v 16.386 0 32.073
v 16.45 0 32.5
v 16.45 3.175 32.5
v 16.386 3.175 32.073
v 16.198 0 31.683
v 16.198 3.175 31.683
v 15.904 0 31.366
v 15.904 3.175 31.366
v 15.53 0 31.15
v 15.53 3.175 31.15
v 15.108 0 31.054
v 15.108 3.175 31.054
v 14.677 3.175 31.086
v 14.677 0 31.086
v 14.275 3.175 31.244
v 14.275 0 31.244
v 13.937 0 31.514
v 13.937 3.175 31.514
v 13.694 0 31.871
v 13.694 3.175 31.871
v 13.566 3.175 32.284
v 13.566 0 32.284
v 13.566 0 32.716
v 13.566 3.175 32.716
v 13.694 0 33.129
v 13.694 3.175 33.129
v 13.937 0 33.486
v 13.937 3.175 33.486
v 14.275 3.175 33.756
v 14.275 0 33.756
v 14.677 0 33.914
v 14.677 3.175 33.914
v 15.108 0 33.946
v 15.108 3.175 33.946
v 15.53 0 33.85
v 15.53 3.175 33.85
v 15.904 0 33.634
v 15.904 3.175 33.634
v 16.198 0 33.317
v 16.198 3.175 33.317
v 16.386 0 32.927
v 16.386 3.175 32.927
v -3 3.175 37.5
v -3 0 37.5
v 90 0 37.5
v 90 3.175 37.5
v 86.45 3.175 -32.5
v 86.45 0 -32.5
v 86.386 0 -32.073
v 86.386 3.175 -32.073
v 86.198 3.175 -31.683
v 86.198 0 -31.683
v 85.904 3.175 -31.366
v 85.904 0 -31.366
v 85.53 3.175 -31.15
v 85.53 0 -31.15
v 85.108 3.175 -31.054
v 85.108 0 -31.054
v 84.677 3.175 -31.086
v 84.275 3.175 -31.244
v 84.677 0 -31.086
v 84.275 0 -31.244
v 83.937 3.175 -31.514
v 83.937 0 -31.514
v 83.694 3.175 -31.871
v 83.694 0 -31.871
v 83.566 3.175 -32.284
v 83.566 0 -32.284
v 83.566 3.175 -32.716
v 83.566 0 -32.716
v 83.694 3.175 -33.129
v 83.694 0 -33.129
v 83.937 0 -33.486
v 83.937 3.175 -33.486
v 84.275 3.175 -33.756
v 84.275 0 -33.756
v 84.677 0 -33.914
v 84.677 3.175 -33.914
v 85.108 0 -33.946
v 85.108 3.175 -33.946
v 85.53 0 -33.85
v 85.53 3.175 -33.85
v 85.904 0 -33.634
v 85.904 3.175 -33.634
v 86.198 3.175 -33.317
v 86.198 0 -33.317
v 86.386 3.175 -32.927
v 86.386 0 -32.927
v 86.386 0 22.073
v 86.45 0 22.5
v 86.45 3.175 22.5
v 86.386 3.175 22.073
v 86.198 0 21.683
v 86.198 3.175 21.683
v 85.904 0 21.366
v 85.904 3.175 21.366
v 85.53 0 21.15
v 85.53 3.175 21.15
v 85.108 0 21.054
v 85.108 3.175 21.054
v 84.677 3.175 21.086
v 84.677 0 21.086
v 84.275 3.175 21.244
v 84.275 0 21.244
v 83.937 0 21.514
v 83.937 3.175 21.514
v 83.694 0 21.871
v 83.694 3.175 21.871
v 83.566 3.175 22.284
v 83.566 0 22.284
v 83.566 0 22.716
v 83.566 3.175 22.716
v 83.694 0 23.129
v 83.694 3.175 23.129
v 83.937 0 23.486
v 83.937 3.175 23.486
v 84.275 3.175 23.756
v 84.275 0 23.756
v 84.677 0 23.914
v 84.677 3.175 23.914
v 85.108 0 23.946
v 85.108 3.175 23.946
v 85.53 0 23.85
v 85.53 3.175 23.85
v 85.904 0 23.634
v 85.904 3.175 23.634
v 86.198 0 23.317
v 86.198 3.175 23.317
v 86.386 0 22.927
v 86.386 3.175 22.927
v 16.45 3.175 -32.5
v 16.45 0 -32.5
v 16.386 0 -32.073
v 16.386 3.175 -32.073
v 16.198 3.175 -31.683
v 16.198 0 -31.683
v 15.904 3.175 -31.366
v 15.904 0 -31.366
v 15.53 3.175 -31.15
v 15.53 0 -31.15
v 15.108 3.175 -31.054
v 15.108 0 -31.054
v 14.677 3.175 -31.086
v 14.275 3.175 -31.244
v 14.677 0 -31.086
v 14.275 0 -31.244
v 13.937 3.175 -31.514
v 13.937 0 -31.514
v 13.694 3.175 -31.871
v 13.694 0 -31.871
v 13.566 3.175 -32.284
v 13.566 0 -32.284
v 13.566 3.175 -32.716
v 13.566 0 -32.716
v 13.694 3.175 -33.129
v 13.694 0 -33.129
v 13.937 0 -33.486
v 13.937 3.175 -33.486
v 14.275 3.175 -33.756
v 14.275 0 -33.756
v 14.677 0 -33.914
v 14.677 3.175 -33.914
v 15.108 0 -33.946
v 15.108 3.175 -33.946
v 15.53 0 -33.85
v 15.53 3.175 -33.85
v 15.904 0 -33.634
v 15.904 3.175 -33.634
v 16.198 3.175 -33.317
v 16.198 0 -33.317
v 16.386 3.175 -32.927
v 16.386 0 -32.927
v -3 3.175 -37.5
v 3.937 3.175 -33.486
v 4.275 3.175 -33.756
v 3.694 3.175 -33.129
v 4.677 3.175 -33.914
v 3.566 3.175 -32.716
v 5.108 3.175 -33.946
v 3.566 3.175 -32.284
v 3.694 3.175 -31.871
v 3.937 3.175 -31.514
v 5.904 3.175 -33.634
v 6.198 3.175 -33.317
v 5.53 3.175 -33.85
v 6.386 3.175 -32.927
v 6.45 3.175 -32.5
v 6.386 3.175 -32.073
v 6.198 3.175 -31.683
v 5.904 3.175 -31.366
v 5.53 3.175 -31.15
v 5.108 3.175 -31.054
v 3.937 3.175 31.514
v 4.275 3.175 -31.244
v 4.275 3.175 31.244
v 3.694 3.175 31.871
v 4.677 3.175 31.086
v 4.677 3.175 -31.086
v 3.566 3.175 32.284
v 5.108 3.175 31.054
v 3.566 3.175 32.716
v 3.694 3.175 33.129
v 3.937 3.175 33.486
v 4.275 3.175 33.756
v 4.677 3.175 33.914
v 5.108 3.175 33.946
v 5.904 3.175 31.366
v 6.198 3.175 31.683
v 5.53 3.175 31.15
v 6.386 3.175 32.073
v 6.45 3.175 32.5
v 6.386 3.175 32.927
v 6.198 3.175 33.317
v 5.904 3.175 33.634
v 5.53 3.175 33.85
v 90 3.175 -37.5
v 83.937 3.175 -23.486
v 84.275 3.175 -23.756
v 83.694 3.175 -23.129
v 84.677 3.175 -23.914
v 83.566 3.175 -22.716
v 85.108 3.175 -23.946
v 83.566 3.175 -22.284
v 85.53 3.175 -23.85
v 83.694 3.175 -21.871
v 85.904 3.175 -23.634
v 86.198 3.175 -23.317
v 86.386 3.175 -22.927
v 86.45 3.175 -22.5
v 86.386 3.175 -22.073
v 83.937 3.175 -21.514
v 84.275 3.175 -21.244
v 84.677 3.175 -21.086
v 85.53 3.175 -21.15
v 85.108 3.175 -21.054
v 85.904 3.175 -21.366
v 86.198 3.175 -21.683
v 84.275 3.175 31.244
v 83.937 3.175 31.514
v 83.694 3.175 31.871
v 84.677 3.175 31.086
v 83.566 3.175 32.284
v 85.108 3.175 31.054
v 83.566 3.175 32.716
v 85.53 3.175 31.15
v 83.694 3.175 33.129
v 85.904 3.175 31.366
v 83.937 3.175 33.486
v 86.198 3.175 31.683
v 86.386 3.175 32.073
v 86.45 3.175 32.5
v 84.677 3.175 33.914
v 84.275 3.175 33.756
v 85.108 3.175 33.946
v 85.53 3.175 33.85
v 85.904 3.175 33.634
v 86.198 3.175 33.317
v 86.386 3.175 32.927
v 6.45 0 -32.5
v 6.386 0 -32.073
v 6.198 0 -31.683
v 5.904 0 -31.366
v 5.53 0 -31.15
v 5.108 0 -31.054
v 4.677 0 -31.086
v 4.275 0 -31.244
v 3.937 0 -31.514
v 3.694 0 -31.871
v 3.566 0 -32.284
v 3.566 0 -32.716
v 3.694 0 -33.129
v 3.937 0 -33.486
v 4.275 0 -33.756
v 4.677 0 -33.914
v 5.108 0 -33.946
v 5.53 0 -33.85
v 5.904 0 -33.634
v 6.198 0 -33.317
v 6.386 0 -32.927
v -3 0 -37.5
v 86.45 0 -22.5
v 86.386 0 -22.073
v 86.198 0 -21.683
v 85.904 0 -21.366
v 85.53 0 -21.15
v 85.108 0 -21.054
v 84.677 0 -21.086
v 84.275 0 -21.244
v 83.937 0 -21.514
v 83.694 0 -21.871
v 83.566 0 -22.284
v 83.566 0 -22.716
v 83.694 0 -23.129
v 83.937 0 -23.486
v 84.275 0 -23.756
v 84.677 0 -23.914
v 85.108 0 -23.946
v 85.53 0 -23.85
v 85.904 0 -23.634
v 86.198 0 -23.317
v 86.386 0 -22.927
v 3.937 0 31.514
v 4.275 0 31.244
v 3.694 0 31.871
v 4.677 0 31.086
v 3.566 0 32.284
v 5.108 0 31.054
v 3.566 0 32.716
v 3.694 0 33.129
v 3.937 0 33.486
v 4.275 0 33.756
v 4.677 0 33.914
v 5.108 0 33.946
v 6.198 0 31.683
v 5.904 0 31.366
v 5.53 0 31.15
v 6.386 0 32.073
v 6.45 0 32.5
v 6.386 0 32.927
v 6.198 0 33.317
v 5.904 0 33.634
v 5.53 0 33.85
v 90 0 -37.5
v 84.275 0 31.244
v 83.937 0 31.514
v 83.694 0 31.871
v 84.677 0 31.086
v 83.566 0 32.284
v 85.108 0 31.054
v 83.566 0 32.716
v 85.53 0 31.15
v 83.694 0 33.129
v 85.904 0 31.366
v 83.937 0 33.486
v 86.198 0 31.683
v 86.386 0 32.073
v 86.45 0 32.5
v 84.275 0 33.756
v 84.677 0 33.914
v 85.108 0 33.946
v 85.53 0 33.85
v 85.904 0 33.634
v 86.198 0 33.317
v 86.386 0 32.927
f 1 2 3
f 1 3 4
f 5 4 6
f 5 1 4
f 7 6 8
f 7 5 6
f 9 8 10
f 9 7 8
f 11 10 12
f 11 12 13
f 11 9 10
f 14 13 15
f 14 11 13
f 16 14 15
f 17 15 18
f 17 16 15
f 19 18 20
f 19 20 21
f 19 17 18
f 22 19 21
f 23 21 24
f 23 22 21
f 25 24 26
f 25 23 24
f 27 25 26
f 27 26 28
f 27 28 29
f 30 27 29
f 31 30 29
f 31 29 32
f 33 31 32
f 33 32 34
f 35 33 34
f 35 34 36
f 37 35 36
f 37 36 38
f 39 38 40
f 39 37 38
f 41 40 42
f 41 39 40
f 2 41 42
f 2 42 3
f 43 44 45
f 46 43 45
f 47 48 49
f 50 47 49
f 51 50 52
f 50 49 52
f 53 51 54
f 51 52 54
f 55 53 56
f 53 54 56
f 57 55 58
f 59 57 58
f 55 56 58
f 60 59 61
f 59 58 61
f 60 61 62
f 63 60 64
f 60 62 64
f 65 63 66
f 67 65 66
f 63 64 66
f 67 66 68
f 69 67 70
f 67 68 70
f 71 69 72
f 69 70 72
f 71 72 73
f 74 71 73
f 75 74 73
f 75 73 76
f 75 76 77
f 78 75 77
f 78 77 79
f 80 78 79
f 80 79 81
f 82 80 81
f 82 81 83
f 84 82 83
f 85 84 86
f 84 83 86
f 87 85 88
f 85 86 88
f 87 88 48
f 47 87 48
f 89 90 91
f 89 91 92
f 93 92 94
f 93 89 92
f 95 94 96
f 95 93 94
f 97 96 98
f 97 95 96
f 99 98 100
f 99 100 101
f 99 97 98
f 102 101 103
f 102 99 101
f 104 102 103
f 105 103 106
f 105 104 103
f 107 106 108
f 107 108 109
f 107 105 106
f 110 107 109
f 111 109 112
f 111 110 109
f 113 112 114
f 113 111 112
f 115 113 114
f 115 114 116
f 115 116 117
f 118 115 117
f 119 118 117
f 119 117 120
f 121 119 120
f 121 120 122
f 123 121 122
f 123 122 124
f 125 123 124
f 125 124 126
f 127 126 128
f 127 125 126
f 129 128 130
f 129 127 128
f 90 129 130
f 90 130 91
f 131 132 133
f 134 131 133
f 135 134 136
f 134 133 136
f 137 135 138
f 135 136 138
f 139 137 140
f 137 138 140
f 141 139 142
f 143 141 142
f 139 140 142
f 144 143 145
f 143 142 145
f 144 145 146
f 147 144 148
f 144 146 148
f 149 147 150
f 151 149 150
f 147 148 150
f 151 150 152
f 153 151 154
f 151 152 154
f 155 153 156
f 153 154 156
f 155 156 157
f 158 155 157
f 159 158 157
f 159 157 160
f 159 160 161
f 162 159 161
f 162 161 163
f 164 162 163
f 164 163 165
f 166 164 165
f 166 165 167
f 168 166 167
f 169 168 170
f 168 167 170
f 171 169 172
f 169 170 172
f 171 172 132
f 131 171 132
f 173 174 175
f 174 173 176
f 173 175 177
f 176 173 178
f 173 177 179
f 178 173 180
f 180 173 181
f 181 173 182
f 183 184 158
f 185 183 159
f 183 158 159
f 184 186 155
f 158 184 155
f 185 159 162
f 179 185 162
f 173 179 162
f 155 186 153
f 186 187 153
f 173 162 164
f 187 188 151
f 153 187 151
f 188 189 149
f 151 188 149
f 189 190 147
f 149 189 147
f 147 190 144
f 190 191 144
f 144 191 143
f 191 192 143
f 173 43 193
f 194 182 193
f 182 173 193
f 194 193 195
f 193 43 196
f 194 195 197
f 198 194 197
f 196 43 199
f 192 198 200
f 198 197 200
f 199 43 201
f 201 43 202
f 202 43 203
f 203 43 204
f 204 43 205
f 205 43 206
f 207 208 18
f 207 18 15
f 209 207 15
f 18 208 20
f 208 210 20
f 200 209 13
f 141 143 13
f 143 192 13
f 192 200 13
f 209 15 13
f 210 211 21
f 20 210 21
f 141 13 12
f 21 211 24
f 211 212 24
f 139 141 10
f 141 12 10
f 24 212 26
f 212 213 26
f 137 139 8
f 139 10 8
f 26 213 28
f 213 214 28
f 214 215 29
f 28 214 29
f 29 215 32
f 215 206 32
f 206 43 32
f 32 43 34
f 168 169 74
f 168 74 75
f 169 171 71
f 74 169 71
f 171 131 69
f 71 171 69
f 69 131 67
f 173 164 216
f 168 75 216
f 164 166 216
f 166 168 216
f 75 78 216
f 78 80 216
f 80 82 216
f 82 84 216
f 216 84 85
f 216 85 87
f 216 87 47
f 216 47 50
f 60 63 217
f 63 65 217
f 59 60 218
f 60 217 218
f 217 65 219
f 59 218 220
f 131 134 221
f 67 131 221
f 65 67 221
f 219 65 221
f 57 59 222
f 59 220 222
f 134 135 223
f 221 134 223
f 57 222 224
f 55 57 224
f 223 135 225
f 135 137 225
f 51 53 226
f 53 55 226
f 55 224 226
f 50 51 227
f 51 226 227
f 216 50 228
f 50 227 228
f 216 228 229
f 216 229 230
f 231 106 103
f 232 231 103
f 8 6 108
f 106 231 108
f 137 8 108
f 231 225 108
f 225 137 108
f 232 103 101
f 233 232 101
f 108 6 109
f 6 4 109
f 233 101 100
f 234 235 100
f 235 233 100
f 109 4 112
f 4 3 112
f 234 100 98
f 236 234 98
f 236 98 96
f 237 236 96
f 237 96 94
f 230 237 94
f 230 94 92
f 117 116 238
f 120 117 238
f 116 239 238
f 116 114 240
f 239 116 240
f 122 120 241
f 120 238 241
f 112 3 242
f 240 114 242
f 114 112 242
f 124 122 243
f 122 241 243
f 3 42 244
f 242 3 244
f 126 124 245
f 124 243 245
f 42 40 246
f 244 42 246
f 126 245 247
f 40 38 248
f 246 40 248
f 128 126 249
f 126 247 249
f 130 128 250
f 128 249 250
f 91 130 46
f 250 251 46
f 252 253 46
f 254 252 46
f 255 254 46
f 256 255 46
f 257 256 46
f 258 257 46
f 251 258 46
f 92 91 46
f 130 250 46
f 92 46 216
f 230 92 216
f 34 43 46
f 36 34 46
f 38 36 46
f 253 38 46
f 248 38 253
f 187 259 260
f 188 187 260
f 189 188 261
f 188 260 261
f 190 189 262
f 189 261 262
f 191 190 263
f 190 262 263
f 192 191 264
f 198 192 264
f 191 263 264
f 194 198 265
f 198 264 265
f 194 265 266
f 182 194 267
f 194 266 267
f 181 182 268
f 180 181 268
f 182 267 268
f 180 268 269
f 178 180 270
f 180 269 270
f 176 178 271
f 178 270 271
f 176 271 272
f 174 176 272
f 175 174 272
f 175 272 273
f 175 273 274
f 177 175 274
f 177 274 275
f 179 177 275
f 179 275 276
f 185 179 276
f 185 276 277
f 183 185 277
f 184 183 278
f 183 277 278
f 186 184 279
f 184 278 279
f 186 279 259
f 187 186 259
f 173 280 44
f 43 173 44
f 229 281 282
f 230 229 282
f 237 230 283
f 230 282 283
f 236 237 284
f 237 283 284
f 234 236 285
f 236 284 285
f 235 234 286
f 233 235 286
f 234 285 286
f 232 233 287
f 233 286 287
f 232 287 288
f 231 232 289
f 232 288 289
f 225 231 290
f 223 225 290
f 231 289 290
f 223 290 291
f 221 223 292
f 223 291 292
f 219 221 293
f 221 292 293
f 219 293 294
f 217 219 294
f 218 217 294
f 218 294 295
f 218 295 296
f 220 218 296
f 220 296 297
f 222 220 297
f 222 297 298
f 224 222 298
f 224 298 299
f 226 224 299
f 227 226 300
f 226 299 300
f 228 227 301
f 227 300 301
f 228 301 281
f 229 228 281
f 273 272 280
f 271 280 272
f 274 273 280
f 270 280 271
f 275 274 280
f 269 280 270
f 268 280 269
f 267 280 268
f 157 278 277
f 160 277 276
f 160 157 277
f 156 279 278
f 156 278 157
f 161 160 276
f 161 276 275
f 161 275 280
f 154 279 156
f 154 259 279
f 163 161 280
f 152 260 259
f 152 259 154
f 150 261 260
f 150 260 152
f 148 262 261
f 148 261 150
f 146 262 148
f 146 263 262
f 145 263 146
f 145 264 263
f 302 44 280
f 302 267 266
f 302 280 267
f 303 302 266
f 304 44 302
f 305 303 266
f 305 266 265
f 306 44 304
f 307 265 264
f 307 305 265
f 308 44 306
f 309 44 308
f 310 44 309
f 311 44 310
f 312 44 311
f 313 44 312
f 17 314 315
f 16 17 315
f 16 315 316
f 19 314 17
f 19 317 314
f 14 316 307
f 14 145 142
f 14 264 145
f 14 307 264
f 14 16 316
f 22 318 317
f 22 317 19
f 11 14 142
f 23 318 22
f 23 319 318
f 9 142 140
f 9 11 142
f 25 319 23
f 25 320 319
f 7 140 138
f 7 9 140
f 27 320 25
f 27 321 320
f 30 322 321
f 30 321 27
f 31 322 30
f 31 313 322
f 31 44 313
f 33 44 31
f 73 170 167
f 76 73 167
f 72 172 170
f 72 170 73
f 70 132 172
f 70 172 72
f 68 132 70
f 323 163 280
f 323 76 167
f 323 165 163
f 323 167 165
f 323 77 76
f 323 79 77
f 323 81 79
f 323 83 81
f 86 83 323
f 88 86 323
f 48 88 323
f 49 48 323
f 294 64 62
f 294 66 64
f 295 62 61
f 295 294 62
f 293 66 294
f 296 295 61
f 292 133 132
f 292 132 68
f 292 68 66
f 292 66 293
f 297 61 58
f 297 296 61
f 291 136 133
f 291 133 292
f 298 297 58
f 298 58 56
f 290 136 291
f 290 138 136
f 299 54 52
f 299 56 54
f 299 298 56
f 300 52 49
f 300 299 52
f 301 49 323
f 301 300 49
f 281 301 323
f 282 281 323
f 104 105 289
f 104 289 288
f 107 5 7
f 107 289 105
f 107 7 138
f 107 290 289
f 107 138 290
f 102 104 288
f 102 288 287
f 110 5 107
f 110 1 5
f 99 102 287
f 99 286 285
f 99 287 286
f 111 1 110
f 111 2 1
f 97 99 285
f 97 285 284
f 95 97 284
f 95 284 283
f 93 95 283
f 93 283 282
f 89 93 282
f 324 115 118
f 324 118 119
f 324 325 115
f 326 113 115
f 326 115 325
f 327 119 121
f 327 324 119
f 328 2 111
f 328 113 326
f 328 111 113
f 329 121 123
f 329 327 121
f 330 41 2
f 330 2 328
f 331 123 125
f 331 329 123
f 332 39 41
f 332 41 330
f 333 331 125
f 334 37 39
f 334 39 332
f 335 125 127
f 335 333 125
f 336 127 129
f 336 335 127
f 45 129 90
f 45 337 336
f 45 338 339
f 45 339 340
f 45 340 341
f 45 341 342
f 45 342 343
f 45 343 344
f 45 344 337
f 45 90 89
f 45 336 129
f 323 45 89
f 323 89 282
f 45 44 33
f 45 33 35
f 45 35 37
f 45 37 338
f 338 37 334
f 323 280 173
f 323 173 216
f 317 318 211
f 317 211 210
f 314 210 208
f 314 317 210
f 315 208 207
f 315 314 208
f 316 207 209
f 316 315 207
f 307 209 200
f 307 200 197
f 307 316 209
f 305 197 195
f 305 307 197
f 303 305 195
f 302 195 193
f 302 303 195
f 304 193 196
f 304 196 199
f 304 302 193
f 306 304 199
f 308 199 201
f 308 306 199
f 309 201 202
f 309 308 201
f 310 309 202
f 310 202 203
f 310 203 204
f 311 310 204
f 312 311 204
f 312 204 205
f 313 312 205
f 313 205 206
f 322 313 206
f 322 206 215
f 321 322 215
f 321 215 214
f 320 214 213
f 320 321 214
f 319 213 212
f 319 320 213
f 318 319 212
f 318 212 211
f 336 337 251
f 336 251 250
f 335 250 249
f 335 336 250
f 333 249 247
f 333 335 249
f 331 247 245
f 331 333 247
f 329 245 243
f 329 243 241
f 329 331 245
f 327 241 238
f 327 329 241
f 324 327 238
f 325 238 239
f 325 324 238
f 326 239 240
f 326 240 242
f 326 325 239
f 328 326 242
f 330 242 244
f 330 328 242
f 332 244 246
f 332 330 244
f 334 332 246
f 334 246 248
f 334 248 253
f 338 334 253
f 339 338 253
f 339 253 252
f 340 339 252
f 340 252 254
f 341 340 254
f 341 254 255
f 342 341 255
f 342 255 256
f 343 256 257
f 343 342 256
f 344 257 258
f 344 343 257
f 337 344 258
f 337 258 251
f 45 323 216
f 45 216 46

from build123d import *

# Parameters (mm, degrees)
SKETCH1_W           = 93
SKETCH1_H           = 37.5
SKETCH1_R           = 1.45
BOSS_EXTRUDE1_DEPTH = 3.175


with BuildPart() as part:
    # Sketch1 → Boss-Extrude1 (new body)
    with BuildSketch(Plane(origin=(0, 0, 0), x_dir=(1, 0, 0), z_dir=(0, 1, 0))):
        with Locations((43.5, -18.75)):
            Rectangle(SKETCH1_W, SKETCH1_H)
        with Locations((85, -32.5)):
            Circle(SKETCH1_R, mode=Mode.SUBTRACT)
        with Locations((85, -22.5)):
            Circle(SKETCH1_R, mode=Mode.SUBTRACT)
        with Locations((5, -32.5)):
            Circle(SKETCH1_R, mode=Mode.SUBTRACT)
        with Locations((15, -32.5)):
            Circle(SKETCH1_R, mode=Mode.SUBTRACT)
    boss_extrude1 = extrude(amount=BOSS_EXTRUDE1_DEPTH)

    # Mirror1: Boss-Extrude1 across plane
    add(boss_extrude1.mirror(Plane(origin=(-3, 3.175, 0), x_dir=(1, 0, 0), z_dir=(0, 0, 1))))


solid = part.part
